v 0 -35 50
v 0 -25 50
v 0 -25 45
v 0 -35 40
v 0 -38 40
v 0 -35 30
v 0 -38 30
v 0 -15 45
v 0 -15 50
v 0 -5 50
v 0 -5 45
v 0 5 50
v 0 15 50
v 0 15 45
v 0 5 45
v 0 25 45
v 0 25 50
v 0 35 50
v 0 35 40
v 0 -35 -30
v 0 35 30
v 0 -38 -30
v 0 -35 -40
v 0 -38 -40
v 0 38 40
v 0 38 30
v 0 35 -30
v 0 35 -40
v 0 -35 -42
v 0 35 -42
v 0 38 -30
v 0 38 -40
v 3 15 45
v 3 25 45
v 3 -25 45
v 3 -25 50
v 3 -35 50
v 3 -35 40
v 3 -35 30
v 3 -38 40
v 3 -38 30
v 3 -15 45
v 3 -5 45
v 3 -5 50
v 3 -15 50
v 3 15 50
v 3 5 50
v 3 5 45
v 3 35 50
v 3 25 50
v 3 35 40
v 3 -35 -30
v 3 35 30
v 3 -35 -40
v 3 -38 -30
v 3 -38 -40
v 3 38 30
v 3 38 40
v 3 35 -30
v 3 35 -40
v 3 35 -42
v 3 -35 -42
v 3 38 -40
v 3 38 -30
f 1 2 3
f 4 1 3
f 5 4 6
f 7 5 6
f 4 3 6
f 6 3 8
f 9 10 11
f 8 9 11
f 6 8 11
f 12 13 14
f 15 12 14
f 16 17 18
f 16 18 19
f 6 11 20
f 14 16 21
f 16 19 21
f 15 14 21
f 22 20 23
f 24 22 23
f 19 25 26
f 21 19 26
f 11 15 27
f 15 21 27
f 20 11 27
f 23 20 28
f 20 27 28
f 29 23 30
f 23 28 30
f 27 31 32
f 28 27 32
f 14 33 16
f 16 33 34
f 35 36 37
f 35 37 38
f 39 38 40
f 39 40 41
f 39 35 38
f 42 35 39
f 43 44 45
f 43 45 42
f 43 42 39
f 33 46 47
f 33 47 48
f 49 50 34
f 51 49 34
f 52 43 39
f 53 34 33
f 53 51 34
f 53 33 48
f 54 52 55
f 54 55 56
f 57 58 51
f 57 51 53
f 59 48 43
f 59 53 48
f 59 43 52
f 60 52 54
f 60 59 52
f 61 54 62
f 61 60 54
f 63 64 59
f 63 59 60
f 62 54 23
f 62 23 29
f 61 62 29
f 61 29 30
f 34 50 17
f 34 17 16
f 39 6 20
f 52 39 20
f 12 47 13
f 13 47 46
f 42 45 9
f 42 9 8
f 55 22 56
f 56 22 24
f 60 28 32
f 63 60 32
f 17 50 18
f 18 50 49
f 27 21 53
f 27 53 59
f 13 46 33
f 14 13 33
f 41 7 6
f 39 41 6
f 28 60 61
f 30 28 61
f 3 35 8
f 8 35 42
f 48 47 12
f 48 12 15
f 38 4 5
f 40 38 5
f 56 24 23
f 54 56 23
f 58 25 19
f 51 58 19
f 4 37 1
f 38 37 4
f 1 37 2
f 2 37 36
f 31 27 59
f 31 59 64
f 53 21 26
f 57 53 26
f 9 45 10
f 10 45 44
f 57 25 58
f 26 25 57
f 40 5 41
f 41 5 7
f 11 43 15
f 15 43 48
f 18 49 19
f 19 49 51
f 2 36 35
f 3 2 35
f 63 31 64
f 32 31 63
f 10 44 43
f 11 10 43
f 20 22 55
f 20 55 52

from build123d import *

# Parameters (mm, degrees)
ESBO_O1_W                = 10
ESBO_O1_H                = 3
ESBO_O1_W_2              = 80
ESBO_O1_H_2              = 70
RESSALTO_EXTRUS_O1_DEPTH = 3
ESBO_O2_W                = 2
ESBO_O2_H                = 70
RESSALTO_EXTRUS_O2_DEPTH = 3
ESBO_O3_W                = 5
ESBO_O3_H                = 70
RESSALTO_EXTRUS_O3_DEPTH = 3
ESBO_O4_W                = 5
ESBO_O4_H                = 10
RESSALTO_EXTRUS_O4_DEPTH = 3


with BuildPart() as part:
    # Esboço1 → Ressalto-extrusão1 (new body)
    with BuildSketch(Plane(origin=(0, 0, 0), x_dir=(0, 0, -1), z_dir=(1, 0, 0))):
        with Locations((-35, 36.5)):
            Rectangle(ESBO_O1_W, ESBO_O1_H)
        with Locations((35, 36.5)):
            Rectangle(ESBO_O1_W, ESBO_O1_H)
        with Locations((35, -36.5)):
            Rectangle(ESBO_O1_W, ESBO_O1_H)
        with Locations((-35, -36.5)):
            Rectangle(ESBO_O1_W, ESBO_O1_H)
        Rectangle(ESBO_O1_W_2, ESBO_O1_H_2)
    extrude(amount=RESSALTO_EXTRUS_O1_DEPTH)

    # Esboço2 → Ressalto-extrusão2 (add)
    with BuildSketch(Plane(origin=(3, 0, 0), x_dir=(0, 0, -1), z_dir=(1, 0, 0))):
        with Locations((41, 0)):
            Rectangle(ESBO_O2_W, ESBO_O2_H)
    extrude(amount=-RESSALTO_EXTRUS_O2_DEPTH)

    # Esboço3 → Ressalto-extrusão3 (add)
    with BuildSketch(Plane(origin=(3, 0, 0), x_dir=(0, 0, -1), z_dir=(1, 0, 0))):
        with Locations((-42.5, 0)):
            Rectangle(ESBO_O3_W, ESBO_O3_H)
    extrude(amount=-RESSALTO_EXTRUS_O3_DEPTH)

    # Esboço4 → Ressalto-extrusão4 (add)
    with BuildSketch(Plane(origin=(3, 0, 0), x_dir=(0, 0, -1), z_dir=(1, 0, 0))):
        with Locations((-47.5, 30)):
            Rectangle(ESBO_O4_W, ESBO_O4_H)
        with Locations((-47.5, 10)):
            Rectangle(ESBO_O4_W, ESBO_O4_H)
        with Locations((-47.5, -10)):
            Rectangle(ESBO_O4_W, ESBO_O4_H)
        with Locations((-47.5, -30)):
            Rectangle(ESBO_O4_W, ESBO_O4_H)
    extrude(amount=-RESSALTO_EXTRUS_O4_DEPTH)


solid = part.part
